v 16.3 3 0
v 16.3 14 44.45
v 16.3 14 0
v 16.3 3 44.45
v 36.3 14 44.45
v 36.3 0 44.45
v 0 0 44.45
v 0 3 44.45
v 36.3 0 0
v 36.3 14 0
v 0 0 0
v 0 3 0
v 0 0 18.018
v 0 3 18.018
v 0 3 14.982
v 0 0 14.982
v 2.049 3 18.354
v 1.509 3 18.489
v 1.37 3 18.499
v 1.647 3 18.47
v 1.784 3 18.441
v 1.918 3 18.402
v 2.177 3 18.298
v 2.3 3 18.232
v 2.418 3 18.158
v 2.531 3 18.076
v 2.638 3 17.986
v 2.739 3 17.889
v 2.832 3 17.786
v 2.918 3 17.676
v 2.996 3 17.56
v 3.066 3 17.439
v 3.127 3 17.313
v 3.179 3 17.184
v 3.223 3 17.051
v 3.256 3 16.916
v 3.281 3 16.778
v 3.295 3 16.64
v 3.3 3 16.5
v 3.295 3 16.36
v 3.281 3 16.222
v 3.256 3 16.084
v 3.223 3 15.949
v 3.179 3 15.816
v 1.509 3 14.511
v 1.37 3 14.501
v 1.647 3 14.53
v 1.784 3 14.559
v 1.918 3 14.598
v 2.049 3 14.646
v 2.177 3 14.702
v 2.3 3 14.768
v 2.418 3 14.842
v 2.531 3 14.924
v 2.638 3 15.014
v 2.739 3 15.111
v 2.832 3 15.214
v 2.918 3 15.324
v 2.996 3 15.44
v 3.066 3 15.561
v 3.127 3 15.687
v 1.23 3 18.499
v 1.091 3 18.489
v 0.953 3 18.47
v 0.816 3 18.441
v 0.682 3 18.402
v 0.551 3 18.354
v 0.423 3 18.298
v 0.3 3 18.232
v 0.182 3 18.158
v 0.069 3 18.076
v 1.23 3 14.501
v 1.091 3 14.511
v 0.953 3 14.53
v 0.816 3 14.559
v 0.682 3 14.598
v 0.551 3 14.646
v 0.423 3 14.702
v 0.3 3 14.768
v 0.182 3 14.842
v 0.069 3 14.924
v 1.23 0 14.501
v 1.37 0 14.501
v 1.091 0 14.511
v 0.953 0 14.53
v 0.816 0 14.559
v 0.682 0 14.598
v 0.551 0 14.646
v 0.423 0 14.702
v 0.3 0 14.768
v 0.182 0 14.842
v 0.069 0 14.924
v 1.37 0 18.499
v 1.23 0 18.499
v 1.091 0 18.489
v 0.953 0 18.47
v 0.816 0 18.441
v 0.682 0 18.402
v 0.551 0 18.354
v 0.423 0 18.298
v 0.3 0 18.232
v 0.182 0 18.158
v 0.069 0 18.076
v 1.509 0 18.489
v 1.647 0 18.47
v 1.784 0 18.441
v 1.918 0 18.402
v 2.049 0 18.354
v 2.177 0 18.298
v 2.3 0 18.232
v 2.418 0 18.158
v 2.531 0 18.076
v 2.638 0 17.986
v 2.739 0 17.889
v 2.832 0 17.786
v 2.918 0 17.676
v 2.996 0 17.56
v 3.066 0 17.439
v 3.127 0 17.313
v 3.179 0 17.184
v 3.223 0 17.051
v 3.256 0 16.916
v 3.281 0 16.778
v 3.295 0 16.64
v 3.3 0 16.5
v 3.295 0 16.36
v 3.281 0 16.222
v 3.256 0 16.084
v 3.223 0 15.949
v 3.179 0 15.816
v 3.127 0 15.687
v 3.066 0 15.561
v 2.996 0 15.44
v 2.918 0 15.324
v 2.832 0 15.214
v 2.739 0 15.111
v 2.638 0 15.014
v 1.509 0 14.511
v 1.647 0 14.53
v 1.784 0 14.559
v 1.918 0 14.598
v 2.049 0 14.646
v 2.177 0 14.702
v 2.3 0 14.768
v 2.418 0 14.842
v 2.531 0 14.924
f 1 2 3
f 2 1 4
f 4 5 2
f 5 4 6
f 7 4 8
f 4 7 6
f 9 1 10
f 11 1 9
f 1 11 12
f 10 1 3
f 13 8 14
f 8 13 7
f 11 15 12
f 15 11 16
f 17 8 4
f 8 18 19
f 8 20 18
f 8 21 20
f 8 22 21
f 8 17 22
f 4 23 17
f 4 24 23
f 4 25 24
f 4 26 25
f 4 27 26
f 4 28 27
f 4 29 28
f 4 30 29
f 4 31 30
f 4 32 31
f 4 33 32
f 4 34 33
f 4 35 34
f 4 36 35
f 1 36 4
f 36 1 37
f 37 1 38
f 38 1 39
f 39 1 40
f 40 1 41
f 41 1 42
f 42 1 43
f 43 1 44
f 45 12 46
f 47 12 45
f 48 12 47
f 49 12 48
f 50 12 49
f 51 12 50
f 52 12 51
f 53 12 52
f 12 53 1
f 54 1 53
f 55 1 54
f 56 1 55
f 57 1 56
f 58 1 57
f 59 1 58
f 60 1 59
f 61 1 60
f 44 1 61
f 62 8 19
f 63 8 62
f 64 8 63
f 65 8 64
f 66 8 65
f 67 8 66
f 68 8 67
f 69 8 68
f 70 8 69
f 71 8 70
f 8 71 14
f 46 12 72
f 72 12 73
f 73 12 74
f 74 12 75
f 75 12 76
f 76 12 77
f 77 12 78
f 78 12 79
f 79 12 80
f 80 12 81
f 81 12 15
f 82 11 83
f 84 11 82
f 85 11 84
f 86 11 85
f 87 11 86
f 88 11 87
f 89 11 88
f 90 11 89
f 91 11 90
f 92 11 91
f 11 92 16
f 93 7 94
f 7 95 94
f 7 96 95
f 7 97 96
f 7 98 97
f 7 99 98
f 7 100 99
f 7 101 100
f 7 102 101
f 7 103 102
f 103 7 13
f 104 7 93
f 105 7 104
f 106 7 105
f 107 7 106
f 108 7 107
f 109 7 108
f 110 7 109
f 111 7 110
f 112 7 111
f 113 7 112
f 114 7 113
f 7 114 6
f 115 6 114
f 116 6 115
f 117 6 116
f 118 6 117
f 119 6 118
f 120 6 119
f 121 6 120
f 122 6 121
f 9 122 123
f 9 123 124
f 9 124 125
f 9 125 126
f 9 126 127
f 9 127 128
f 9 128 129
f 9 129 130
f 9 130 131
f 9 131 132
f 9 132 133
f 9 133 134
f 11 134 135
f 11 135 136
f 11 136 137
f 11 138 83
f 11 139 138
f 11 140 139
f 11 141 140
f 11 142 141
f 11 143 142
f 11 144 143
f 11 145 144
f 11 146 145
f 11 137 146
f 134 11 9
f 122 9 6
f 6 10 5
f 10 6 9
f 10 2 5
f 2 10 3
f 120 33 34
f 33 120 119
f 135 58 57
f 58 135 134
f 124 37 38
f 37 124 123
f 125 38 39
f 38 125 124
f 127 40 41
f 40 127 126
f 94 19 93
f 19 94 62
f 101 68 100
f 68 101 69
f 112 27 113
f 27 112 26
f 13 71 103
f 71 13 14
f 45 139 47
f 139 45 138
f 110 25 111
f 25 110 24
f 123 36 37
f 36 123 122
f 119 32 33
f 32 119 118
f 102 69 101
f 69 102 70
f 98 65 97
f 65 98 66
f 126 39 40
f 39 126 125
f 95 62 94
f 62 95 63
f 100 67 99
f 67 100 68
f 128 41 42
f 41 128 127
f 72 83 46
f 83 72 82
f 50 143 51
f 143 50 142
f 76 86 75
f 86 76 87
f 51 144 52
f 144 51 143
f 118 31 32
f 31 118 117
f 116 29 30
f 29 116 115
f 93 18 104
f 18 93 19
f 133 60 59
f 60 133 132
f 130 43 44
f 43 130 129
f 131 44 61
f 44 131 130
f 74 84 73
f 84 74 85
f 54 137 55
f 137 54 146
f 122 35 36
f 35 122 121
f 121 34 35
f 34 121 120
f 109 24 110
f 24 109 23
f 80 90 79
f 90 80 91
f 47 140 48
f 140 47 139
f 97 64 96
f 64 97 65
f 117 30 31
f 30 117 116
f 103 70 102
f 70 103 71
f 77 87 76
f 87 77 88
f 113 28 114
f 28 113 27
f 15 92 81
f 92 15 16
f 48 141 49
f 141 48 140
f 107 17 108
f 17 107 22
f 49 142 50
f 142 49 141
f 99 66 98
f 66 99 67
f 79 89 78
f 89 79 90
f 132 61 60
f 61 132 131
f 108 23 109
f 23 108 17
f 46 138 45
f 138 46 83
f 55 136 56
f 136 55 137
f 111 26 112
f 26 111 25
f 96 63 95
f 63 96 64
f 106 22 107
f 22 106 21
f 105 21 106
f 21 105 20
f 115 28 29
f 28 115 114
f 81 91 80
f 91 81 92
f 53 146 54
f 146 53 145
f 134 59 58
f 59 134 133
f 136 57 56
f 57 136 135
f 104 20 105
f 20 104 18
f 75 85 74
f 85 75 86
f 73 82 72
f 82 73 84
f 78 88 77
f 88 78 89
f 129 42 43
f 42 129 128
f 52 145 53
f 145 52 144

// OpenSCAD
// file: ../../utils/constants.scad
$fn=90;  // accuracy

/* Server dimentions */

// one server unit
u1 = 44.45;  

// two server unit
u2 = u1*2;   

// total width
// The total with of the a server rack (19")
// this includes the mounting holes
tw  = 482.6; 

// Total inner width
// The distance between the mounting holes in the server rack
tiw = 450; // TODO: 432?  


/* Rack hole dimentions */

// width distance rack holes
wdrh = 465;

// height distance rack holes
hdrh = 33;


/* dell optiplex 7040 micro usff dimentions */

// dell optiplex 7040 height
do7040h = 36;

// dell optiplex 7040 width
do7040w = 182;

// dell optiplex 7040 depth
do7040d = 179;

// dell optiplex 7040 rubber feet width distance
do7040rfwd = 14.9;

// dell optiplex 7040 rubber feet back depth distance
do7040rfbdd = 9.9;


/* Case dimentions */

// case height outer 
// A small margin is included to so that the case does not 
// exide two server units
cho = u2-0.2; 

// case height inner
// The thickness of the walls can then be calculated as (cho-chi)/2
chi = cho-7*2;

// case width outer
// as there are three parts of the rack server case we just devide
// the total inner width with three 
cwo = tiw/3;

// case width inner
// 132 was calculated by defining by the desired with between each node, 
// i.e., 22. The first and last hole is 22/2 mm away from the side of the case.
// This gives us 22*5+(22/2)*2 = 22*6 = 132
cwi = 132;

// case depth thickness
// How thick the case should be. It should not be that important.
// Just know that it is enough for a screw to thread in the case 
cdt = 14;

// case inner side thickness
// The middle and the side case over lap so that a screw can be entered
// between the two cases. The cist is defined as the thickness of the part
// that does not overlap between the midle and side case.
cist = 3.5;

// nodes per case
npc = 6;
// main file
include <../../utils/constants.scad>;

/* caseSideMount
    ew: extended width, is the the width from the end of the rack mount to the usff-pc
    height: should be the same as usff-pc height
    mt: mount thickness
    ct: case thickness
*/
module caseSideMount(ew, height, mt, ct) {
  mw = (tw-tiw)/2; // Mount width
  hpw1 = mw-(wdrh-tiw); // Hole position width 1
  hpw2 = mw-(wdrh-tiw); // Hole position width 2
  hph1 = hdrh*3/2; // Hole height width 1
  hph2 = hdrh/2; // Hole height width 2

  difference() {
    union() {
      cube([mw,mt,height]);

      translate([mw,0,0])
      cube([ew,ct,height]);
    }

    union() {
      translate([hpw1,mt,hph1])
      rotate([90,0,0])
      cylinder(d=4, h=mt);

      translate([hpw2,mt,hph2])
      rotate([90,0,0])
      cylinder(d=4, h=mt);
    }
  }
}

caseSideMount(20, u1, 3, 14);
